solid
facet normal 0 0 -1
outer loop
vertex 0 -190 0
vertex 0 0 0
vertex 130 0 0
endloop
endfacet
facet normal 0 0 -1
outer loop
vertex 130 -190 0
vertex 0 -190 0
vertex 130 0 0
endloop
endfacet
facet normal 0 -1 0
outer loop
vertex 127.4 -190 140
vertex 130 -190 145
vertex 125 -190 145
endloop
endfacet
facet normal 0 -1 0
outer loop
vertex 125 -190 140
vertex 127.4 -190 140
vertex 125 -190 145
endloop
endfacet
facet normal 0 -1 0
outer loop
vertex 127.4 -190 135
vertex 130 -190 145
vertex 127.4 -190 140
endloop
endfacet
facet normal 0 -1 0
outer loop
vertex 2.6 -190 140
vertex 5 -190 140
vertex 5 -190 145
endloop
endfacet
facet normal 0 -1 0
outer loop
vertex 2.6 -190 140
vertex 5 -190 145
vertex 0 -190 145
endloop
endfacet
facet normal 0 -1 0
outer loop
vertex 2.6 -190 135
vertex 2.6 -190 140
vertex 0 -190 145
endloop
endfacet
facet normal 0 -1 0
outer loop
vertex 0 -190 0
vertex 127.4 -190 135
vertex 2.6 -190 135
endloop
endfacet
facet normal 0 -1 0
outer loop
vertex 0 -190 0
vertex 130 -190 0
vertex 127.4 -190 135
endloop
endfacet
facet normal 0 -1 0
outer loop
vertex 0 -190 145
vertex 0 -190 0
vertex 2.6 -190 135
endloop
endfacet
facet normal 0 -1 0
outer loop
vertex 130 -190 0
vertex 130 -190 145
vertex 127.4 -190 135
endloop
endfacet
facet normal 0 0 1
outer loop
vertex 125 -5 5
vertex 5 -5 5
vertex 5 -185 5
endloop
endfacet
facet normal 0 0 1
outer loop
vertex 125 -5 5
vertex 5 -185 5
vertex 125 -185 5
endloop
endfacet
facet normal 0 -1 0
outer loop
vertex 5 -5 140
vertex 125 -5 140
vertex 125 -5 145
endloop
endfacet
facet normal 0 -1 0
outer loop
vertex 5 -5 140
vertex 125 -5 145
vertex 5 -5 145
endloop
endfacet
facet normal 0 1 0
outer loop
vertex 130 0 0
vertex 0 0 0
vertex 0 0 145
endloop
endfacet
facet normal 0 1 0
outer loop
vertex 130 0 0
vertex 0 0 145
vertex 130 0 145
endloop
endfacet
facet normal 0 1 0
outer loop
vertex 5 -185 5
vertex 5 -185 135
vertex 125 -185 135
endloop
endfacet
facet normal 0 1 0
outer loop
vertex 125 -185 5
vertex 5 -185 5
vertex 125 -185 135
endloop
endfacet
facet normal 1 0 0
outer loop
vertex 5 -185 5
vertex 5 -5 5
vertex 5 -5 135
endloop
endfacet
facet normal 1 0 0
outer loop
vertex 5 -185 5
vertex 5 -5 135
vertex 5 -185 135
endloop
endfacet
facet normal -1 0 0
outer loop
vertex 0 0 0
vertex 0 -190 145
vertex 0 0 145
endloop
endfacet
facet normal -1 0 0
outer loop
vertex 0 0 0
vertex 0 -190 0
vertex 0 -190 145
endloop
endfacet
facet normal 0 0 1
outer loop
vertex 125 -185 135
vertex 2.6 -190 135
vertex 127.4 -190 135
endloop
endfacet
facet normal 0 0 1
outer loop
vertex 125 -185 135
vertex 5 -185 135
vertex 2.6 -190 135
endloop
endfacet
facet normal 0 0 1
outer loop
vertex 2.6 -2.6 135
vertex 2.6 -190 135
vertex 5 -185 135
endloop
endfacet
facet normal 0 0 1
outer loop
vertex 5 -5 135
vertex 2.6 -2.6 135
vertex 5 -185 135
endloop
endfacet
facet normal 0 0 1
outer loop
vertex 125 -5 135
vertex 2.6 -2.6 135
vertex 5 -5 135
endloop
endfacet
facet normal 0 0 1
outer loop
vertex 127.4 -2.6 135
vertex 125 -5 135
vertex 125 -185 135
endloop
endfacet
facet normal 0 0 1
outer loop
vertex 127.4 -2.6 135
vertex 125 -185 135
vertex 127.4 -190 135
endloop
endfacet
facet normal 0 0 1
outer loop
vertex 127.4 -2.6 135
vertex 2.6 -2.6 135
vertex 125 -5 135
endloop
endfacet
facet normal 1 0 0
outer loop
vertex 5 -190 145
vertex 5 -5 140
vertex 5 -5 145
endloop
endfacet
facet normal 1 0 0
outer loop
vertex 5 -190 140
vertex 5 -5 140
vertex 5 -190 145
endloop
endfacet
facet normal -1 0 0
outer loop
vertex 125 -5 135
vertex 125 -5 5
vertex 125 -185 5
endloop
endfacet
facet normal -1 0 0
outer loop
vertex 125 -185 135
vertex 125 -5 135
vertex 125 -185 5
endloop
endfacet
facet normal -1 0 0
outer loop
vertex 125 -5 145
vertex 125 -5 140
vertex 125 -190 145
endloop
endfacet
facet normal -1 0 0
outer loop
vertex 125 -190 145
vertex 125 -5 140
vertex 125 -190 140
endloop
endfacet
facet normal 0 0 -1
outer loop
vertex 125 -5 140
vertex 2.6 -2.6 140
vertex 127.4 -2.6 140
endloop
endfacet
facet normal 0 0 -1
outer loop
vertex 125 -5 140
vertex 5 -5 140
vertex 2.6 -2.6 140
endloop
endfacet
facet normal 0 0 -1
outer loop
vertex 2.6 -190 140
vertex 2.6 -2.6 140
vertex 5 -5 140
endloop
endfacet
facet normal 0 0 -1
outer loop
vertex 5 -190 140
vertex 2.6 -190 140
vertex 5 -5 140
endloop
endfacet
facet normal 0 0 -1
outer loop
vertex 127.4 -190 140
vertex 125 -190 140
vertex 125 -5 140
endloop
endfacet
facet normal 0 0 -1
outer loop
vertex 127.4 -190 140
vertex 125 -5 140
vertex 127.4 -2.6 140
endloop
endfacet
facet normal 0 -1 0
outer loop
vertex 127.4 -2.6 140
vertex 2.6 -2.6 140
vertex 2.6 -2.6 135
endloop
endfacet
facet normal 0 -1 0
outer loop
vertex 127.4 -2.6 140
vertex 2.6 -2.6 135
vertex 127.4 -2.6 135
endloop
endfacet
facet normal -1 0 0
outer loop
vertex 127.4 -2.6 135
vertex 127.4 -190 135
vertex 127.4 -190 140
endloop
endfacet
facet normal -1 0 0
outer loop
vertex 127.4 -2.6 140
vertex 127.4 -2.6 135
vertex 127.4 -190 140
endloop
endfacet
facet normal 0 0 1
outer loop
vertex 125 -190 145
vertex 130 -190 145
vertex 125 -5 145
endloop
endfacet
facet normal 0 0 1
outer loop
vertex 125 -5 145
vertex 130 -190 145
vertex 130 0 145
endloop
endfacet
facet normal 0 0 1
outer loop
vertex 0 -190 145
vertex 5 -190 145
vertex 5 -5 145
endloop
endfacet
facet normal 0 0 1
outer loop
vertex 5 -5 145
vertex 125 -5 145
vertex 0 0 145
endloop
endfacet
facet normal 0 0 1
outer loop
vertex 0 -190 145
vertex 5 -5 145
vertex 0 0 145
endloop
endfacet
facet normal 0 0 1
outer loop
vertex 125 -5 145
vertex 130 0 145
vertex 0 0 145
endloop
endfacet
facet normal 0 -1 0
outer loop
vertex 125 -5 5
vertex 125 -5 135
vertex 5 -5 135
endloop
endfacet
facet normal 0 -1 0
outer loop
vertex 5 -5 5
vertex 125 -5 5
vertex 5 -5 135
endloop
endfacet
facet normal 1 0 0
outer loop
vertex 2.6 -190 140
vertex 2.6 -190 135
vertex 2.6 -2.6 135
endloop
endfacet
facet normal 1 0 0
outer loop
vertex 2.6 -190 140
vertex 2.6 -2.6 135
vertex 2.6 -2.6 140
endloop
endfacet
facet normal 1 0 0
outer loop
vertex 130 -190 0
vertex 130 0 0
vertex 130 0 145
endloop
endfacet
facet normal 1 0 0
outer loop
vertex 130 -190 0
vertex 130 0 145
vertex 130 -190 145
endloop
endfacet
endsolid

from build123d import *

# Parameters (mm, degrees)
SKETCH1_W           = 130
SKETCH1_H           = 190
BOSS_EXTRUDE1_DEPTH = 5
SKETCH2_W           = 130
SKETCH2_H           = 190
SKETCH2_W_2         = 120
SKETCH2_H_2         = 180
BOSS_EXTRUDE2_DEPTH = 130
BOSS_EXTRUDE3_DEPTH = 10
SKETCH4_W           = 2.4
SKETCH4_H           = 5
CUT_EXTRUDE1_DEPTH  = 187.4
SKETCH5_W           = 120
SKETCH5_H           = 5
CUT_EXTRUDE2_DEPTH  = 2.4


with BuildPart() as part:
    # Sketch1 → Boss-Extrude1 (new body)
    with BuildSketch(Plane.XY):
        with Locations((65, -95)):
            Rectangle(SKETCH1_W, SKETCH1_H)
    extrude(amount=BOSS_EXTRUDE1_DEPTH)

    # Sketch2 → Boss-Extrude2 (add)
    with BuildSketch(Plane.XY.offset(5)):
        with Locations((65, -95)):
            Rectangle(SKETCH2_W, SKETCH2_H)
        with Locations((65, -95)):
            Rectangle(SKETCH2_W_2, SKETCH2_H_2, mode=Mode.SUBTRACT)
    extrude(amount=BOSS_EXTRUDE2_DEPTH)

    # Sketch3 → Boss-Extrude3 (add)
    with BuildSketch(Plane.XY.offset(135)):
        Polygon((0, -190), (0, 0), (130, 0), (130, -190), (125, -190), (125, -185), (125, -5), (5, -5), (5, -190), align=None)
    extrude(amount=BOSS_EXTRUDE3_DEPTH)

    # Sketch4 → Cut-Extrude1 (cut)
    with BuildSketch(Plane.XZ.offset(190)):
        with Locations((3.8, 137.5)):
            Rectangle(SKETCH4_W, SKETCH4_H)
        with Locations((126.2, 137.5)):
            Rectangle(SKETCH4_W, SKETCH4_H)
    extrude(amount=-CUT_EXTRUDE1_DEPTH, mode=Mode.SUBTRACT)

    # Sketch5 → Cut-Extrude2 (cut)
    with BuildSketch(Plane.XZ.offset(5)):
        with Locations((65, 137.5)):
            Rectangle(SKETCH5_W, SKETCH5_H)
    extrude(amount=-CUT_EXTRUDE2_DEPTH, mode=Mode.SUBTRACT)


solid = part.part
